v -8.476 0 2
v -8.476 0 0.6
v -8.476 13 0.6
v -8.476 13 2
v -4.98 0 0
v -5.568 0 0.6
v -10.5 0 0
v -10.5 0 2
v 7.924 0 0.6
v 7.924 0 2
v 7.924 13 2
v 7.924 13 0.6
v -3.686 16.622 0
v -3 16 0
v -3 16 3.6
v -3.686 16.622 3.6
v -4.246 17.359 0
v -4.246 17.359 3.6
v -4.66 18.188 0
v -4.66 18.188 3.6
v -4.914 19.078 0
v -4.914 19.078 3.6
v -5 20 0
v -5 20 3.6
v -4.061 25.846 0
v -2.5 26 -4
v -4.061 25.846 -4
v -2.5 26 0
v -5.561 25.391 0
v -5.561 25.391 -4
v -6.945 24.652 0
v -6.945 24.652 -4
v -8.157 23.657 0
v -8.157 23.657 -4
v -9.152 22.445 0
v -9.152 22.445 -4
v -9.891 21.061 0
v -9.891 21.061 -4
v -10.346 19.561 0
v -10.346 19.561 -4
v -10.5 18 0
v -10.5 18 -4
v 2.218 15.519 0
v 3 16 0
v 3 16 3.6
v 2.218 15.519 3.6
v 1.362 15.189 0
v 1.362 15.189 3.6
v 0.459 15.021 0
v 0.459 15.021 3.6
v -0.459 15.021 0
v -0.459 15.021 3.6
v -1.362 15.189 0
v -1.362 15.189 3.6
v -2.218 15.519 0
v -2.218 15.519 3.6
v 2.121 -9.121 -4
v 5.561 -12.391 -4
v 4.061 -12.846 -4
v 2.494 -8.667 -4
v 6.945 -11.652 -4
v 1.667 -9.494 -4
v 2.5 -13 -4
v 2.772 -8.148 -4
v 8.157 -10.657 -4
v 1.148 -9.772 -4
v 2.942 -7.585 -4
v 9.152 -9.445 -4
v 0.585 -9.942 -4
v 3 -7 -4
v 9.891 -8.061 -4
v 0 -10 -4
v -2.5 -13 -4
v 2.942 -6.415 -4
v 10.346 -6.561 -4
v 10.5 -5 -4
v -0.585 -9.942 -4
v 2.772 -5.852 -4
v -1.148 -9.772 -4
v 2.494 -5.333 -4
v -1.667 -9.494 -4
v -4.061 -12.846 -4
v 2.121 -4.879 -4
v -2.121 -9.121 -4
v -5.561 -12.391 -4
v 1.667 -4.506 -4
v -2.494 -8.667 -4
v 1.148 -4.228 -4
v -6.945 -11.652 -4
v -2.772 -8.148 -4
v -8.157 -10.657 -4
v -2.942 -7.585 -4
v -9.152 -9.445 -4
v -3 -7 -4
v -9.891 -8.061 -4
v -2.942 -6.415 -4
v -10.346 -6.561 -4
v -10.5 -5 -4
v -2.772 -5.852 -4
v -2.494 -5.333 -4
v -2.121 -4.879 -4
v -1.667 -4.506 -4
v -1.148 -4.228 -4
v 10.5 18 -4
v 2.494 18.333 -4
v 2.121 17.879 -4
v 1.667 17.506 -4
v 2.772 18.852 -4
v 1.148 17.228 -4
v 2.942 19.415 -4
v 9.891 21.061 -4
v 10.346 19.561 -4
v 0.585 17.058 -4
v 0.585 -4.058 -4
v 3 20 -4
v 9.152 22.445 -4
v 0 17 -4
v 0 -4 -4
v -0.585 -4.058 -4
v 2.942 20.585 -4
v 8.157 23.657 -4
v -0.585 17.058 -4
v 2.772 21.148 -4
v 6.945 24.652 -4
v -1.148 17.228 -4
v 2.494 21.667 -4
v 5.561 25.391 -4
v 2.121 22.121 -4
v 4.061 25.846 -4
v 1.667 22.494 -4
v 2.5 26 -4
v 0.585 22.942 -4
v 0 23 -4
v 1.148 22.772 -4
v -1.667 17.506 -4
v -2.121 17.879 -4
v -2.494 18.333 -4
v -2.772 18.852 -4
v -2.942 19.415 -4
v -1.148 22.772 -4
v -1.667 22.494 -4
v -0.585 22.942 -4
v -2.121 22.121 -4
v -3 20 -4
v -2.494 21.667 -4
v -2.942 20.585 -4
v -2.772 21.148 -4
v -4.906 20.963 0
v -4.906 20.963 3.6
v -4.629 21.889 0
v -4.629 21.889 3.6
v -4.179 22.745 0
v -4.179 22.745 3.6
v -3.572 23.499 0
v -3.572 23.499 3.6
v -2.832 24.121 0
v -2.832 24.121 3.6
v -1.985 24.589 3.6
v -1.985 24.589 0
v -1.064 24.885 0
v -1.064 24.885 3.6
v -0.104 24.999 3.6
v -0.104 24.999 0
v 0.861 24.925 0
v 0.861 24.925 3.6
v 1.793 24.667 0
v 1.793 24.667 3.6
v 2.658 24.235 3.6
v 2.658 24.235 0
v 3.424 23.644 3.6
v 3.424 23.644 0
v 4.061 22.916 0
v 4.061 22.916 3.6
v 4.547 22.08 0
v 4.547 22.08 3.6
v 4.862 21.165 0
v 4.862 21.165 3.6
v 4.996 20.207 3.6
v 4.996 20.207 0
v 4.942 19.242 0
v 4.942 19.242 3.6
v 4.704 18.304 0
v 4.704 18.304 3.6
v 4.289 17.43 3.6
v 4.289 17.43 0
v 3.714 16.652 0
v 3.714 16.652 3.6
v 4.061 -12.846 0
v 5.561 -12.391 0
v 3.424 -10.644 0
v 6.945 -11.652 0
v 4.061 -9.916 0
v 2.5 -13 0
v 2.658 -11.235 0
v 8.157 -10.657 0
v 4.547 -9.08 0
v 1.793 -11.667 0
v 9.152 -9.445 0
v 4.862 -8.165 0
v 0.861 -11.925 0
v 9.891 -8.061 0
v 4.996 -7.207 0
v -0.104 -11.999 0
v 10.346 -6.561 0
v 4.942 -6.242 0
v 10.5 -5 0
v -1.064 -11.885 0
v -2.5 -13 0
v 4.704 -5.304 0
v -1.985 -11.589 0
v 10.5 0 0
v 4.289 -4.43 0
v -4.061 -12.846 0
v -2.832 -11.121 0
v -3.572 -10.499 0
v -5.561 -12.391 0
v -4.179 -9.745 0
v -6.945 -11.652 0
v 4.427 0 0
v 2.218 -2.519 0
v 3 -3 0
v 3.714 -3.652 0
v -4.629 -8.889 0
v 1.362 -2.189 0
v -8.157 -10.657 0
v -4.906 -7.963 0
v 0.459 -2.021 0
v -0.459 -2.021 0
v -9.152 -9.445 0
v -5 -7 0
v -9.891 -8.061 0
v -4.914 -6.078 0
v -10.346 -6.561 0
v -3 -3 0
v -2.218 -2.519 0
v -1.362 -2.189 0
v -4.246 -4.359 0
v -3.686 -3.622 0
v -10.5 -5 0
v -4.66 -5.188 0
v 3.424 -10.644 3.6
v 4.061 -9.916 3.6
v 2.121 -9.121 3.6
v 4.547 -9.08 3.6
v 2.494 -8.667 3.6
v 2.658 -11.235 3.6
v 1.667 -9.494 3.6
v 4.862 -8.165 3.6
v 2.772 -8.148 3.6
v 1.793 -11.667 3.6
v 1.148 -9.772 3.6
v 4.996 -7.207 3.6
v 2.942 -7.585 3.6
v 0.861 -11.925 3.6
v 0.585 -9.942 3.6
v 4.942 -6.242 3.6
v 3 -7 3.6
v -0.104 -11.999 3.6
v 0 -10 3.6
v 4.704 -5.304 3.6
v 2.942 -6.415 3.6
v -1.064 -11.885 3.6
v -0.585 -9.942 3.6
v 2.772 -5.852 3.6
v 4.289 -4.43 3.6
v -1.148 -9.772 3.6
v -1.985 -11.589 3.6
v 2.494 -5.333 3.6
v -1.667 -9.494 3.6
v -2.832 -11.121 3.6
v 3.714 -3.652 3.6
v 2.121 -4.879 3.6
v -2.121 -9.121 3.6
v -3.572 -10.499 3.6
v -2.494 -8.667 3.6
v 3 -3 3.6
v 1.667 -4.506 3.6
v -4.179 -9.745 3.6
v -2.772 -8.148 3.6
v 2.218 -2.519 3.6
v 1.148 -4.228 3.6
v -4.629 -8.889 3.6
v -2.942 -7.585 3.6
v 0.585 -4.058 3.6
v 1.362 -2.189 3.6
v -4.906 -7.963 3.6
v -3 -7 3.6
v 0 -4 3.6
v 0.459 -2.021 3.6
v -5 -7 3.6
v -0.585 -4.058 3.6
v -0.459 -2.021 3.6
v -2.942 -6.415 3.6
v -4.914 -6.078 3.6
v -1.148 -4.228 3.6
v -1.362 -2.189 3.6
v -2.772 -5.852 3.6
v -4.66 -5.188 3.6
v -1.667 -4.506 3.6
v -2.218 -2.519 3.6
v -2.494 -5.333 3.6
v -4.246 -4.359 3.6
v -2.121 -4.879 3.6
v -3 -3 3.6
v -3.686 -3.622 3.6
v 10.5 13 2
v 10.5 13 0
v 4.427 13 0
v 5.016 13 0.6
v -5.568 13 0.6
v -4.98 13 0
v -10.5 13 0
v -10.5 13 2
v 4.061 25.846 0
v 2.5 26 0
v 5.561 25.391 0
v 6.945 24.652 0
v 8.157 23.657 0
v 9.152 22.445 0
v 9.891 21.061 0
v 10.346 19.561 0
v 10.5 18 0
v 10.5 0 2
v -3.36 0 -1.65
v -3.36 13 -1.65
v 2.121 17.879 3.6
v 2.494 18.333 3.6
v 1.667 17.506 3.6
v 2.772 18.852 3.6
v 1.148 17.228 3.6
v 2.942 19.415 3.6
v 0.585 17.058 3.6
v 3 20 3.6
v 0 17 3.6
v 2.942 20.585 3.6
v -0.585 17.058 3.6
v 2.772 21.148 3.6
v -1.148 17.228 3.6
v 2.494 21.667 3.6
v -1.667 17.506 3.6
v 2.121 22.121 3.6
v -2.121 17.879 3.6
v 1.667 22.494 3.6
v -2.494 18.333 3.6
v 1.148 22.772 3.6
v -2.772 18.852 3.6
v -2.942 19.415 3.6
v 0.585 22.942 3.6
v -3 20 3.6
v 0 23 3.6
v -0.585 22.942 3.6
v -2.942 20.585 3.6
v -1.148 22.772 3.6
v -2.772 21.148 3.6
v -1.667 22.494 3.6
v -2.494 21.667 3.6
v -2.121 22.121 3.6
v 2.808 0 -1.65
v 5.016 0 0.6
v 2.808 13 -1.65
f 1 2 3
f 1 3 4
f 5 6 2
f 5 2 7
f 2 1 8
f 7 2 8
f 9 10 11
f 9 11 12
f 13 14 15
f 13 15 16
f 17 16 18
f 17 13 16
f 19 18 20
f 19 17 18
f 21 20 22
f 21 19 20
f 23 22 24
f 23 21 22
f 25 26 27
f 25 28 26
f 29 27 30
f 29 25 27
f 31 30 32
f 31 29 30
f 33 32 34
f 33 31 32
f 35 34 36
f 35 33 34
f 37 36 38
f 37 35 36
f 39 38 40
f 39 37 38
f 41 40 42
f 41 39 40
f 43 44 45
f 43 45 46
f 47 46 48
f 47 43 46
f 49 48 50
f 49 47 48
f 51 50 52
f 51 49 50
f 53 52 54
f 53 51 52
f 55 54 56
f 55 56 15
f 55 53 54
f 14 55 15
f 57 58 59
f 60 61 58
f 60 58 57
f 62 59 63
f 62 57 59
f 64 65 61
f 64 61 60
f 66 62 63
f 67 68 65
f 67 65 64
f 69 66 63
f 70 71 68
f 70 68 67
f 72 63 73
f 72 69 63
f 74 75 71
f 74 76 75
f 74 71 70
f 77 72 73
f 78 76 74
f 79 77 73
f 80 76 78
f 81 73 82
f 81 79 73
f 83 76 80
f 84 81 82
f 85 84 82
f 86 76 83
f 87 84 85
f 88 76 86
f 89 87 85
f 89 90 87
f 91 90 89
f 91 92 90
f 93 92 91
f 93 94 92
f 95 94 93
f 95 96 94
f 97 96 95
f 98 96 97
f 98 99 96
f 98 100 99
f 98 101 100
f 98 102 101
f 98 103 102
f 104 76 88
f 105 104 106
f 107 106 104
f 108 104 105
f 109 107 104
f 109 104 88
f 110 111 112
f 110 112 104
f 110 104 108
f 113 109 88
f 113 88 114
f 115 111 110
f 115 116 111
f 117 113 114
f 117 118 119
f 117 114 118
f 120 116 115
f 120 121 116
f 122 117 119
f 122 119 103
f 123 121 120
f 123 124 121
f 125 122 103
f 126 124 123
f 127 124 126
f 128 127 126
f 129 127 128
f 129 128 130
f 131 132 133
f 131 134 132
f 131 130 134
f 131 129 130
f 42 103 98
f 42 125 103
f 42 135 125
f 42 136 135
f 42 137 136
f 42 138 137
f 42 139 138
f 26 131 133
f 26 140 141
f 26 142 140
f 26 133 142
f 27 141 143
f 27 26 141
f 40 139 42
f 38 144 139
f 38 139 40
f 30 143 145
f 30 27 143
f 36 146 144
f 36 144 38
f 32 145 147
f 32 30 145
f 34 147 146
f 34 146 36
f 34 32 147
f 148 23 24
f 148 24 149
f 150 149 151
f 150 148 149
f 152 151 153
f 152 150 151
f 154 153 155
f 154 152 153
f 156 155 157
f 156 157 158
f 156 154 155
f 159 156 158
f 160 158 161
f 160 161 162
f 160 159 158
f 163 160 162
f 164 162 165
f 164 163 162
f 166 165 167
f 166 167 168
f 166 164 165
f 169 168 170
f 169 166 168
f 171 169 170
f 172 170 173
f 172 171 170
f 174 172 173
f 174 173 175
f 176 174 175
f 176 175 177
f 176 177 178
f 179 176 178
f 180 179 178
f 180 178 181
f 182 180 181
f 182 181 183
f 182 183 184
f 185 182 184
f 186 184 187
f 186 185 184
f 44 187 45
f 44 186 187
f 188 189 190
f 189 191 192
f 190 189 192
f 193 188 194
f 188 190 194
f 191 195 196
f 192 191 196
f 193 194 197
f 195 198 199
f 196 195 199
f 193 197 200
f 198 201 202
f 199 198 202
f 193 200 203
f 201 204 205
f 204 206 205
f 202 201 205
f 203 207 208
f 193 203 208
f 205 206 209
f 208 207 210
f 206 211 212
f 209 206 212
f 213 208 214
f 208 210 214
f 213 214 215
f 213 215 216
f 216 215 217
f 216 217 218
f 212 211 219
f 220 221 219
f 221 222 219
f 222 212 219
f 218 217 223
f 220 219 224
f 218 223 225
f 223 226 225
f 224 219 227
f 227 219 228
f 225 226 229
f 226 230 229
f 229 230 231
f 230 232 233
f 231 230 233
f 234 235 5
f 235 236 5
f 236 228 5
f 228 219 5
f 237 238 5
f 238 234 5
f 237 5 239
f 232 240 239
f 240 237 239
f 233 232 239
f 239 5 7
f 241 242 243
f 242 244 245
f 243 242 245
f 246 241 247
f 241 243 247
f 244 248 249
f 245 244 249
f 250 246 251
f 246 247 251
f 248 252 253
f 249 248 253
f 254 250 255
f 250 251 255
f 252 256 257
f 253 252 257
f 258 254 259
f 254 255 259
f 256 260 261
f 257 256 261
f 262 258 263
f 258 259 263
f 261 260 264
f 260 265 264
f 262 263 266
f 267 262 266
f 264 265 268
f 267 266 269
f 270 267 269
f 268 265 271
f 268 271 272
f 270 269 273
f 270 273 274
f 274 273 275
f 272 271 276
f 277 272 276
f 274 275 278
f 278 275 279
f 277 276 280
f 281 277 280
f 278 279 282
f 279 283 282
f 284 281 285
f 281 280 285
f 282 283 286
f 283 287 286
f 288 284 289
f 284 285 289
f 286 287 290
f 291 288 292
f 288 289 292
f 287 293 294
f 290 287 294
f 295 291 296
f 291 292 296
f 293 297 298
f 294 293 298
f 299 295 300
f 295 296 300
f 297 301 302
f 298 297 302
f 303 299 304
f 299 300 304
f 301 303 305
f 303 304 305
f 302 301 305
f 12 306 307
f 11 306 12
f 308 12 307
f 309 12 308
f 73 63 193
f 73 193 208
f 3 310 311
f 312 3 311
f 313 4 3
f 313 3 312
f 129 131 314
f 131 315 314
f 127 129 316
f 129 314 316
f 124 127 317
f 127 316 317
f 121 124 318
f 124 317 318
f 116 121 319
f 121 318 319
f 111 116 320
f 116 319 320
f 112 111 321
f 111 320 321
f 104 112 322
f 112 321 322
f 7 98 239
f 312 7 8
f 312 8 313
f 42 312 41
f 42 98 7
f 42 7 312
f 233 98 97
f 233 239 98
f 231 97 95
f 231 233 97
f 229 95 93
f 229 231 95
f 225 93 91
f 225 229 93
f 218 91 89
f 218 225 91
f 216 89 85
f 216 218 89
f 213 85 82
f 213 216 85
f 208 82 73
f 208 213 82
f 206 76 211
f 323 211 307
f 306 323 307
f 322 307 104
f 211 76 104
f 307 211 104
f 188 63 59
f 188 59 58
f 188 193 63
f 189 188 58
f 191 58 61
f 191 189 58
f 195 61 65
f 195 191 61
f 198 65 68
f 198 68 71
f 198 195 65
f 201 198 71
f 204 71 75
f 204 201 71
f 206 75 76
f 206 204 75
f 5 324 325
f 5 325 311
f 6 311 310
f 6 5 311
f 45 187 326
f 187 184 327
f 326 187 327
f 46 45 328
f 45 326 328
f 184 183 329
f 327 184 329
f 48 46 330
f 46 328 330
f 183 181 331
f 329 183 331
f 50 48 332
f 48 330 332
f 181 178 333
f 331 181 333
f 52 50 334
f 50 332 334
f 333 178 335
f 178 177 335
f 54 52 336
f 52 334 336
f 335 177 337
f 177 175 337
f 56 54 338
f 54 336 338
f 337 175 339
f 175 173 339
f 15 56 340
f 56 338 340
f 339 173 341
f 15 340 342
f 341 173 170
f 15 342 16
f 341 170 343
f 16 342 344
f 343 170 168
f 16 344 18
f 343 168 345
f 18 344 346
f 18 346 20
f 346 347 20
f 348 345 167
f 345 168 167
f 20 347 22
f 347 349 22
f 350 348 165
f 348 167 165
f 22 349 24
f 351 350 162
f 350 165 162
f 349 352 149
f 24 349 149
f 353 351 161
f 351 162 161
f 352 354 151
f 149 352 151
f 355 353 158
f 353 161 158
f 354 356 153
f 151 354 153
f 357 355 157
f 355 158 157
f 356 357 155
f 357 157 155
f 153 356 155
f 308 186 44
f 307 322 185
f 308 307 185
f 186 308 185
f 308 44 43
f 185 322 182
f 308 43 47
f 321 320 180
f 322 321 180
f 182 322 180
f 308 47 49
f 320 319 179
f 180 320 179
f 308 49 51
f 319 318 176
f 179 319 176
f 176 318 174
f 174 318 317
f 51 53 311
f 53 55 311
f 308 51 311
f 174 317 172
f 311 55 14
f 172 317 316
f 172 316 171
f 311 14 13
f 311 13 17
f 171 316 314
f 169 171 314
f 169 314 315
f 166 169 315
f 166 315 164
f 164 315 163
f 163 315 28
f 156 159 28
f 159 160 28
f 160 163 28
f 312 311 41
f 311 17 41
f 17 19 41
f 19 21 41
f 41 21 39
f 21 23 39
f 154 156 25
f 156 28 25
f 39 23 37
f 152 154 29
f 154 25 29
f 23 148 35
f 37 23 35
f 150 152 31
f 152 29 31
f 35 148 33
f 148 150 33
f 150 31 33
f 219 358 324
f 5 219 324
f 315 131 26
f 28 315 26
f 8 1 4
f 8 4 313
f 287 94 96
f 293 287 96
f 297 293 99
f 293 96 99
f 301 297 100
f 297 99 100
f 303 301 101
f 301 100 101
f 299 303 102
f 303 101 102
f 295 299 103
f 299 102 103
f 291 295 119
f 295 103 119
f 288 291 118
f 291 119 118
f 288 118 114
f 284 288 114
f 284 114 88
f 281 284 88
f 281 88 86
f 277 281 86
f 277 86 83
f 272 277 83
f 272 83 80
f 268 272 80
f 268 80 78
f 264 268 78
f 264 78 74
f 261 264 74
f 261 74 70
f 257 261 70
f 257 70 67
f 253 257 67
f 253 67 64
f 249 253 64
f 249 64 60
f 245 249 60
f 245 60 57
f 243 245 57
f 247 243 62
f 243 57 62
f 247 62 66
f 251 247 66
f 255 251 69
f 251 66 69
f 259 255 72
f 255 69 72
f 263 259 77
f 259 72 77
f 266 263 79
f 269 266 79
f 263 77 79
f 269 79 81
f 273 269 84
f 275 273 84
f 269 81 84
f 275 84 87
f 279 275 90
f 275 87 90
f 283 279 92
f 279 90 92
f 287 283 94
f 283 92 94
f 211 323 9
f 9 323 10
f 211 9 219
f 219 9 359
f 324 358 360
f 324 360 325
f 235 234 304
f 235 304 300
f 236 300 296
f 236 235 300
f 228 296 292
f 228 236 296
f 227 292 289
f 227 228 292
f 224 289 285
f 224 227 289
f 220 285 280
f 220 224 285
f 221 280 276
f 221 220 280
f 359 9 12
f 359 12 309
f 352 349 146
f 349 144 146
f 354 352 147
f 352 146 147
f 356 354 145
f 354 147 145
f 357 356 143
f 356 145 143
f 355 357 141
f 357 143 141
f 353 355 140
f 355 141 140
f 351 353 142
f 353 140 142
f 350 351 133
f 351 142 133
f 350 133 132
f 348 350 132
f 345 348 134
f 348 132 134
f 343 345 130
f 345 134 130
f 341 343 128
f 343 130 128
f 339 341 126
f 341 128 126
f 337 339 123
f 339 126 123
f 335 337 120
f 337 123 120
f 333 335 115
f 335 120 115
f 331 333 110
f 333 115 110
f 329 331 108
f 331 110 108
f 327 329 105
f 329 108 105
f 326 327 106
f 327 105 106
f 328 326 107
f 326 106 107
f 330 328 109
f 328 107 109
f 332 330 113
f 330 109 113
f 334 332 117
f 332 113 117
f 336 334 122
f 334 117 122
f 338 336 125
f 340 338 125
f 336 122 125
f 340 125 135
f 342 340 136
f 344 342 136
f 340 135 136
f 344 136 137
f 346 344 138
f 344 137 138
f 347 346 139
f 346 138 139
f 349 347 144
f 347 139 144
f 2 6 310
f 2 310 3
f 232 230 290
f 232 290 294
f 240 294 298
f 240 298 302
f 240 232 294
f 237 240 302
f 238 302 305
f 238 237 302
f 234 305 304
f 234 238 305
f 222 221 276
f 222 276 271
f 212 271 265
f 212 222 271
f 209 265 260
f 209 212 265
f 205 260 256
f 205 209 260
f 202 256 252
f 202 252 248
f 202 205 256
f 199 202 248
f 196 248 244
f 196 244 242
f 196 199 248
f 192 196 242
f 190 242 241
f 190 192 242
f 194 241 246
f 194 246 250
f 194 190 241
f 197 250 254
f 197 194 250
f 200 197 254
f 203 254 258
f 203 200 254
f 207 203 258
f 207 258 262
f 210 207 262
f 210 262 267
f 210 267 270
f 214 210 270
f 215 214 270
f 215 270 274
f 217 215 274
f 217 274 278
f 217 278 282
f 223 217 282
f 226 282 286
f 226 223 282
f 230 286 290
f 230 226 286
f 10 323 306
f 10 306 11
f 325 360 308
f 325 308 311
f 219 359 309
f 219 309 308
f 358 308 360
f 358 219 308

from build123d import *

# Parameters (mm, degrees)
DODANIE_WYCI_GNI_CIE4_DEPTH = 13
SZKIC4_W                    = 21
SZKIC4_H                    = 13
DODANIE_WYCI_GNI_CIE5_DEPTH = 2
SZKIC5_W                    = 21
SZKIC5_H                    = 13
SZKIC5_R                    = 3
DODANIE_WYCI_GNI_CIE6_DEPTH = 4
DODANIE_WYCI_GNI_CIE7_START = -4
SZKIC5_4_R                  = 3
DODANIE_WYCI_GNI_CIE7_DEPTH = 3.6
ZAOKR_GLENIE3_R             = 8


with BuildPart() as part:
    # Szkic3 → Dodanie-wyci_gni_cie4 (new body)
    with BuildSketch(Plane(origin=(0, 0, 0), x_dir=(1, 0, 0), z_dir=(0, 1, 0))):
        Polygon((7.923824764, -2), (7.923824764, -0.6), (5.016097838, -0.6), (2.807764504, 1.65), (-3.360114975, 1.65), (-5.568448309, -0.6), (-8.476175236, -0.6), (-8.476175236, -2), (-10.5, -2), (-10.5, 2), (10.5, 2), (10.5, -2), align=None)
    extrude(amount=DODANIE_WYCI_GNI_CIE4_DEPTH)

    # Szkic4 → Dodanie-wyci_gni_cie5 (add)
    with BuildSketch(Plane(origin=(0, 0, -2), x_dir=(-1, 0, 0), z_dir=(0, 0, -1))):
        with Locations((0, 6.5)):
            Rectangle(SZKIC4_W, SZKIC4_H)
    extrude(amount=DODANIE_WYCI_GNI_CIE5_DEPTH)

    # Szkic5 → Dodanie-wyci_gni_cie6 (add)
    with BuildSketch(Plane(origin=(0, 0, -4), x_dir=(-1, 0, 0), z_dir=(0, 0, -1))):
        with Locations((0, 19.5)):
            Rectangle(SZKIC5_W, SZKIC5_H)
        with Locations((0, 20)):
            Circle(SZKIC5_R, mode=Mode.SUBTRACT)
        with Locations((0, -6.5)):
            Rectangle(SZKIC5_W, SZKIC5_H)
        with Locations((0, -7)):
            Circle(SZKIC5_R, mode=Mode.SUBTRACT)
    extrude(amount=-DODANIE_WYCI_GNI_CIE6_DEPTH)

    # Szkic5_4 → Dodanie-wyci_gni_cie7 (add)
    with BuildSketch(Plane(origin=(0, 0, -4), x_dir=(-1, 0, 0), z_dir=(0, 0, -1)).offset(DODANIE_WYCI_GNI_CIE7_START)):
        with BuildLine():
            Line((3, 16), (-3, 16))
            ThreePointArc((-3, 16), (0, 15), (3, 16))
        make_face()
        with BuildLine():
            ThreePointArc((5, 20), (-2.236067977, 24.472135955), (-3, 16))
            Line((-3, 16), (3, 16))
            ThreePointArc((3, 16), (4.472135955, 17.763932023), (5, 20))
        make_face()
        with Locations((0, 20)):
            Circle(SZKIC5_4_R, mode=Mode.SUBTRACT)
        with BuildLine():
            Line((-3, -3), (3, -3))
            ThreePointArc((3, -3), (0, -2), (-3, -3))
        make_face()
        with BuildLine():
            ThreePointArc((5, -7), (4.472135955, -4.763932023), (3, -3))
            Line((3, -3), (-3, -3))
            ThreePointArc((-3, -3), (-2.236067977, -11.472135955), (5, -7))
        make_face()
        with Locations((0, -7)):
            Circle(SZKIC5_4_R, mode=Mode.SUBTRACT)
    extrude(amount=-DODANIE_WYCI_GNI_CIE7_DEPTH)

    # Zaokr_glenie3
    zaokr_glenie3_edges = [part.edges().sort_by_distance(p)[0] for p in [
        (-10.5, -13, -2),
        (10.5, -13, -2),
        (10.5, 26, -2),
        (-10.5, 26, -2),
    ]]
    fillet(zaokr_glenie3_edges, radius=ZAOKR_GLENIE3_R)


solid = part.part
